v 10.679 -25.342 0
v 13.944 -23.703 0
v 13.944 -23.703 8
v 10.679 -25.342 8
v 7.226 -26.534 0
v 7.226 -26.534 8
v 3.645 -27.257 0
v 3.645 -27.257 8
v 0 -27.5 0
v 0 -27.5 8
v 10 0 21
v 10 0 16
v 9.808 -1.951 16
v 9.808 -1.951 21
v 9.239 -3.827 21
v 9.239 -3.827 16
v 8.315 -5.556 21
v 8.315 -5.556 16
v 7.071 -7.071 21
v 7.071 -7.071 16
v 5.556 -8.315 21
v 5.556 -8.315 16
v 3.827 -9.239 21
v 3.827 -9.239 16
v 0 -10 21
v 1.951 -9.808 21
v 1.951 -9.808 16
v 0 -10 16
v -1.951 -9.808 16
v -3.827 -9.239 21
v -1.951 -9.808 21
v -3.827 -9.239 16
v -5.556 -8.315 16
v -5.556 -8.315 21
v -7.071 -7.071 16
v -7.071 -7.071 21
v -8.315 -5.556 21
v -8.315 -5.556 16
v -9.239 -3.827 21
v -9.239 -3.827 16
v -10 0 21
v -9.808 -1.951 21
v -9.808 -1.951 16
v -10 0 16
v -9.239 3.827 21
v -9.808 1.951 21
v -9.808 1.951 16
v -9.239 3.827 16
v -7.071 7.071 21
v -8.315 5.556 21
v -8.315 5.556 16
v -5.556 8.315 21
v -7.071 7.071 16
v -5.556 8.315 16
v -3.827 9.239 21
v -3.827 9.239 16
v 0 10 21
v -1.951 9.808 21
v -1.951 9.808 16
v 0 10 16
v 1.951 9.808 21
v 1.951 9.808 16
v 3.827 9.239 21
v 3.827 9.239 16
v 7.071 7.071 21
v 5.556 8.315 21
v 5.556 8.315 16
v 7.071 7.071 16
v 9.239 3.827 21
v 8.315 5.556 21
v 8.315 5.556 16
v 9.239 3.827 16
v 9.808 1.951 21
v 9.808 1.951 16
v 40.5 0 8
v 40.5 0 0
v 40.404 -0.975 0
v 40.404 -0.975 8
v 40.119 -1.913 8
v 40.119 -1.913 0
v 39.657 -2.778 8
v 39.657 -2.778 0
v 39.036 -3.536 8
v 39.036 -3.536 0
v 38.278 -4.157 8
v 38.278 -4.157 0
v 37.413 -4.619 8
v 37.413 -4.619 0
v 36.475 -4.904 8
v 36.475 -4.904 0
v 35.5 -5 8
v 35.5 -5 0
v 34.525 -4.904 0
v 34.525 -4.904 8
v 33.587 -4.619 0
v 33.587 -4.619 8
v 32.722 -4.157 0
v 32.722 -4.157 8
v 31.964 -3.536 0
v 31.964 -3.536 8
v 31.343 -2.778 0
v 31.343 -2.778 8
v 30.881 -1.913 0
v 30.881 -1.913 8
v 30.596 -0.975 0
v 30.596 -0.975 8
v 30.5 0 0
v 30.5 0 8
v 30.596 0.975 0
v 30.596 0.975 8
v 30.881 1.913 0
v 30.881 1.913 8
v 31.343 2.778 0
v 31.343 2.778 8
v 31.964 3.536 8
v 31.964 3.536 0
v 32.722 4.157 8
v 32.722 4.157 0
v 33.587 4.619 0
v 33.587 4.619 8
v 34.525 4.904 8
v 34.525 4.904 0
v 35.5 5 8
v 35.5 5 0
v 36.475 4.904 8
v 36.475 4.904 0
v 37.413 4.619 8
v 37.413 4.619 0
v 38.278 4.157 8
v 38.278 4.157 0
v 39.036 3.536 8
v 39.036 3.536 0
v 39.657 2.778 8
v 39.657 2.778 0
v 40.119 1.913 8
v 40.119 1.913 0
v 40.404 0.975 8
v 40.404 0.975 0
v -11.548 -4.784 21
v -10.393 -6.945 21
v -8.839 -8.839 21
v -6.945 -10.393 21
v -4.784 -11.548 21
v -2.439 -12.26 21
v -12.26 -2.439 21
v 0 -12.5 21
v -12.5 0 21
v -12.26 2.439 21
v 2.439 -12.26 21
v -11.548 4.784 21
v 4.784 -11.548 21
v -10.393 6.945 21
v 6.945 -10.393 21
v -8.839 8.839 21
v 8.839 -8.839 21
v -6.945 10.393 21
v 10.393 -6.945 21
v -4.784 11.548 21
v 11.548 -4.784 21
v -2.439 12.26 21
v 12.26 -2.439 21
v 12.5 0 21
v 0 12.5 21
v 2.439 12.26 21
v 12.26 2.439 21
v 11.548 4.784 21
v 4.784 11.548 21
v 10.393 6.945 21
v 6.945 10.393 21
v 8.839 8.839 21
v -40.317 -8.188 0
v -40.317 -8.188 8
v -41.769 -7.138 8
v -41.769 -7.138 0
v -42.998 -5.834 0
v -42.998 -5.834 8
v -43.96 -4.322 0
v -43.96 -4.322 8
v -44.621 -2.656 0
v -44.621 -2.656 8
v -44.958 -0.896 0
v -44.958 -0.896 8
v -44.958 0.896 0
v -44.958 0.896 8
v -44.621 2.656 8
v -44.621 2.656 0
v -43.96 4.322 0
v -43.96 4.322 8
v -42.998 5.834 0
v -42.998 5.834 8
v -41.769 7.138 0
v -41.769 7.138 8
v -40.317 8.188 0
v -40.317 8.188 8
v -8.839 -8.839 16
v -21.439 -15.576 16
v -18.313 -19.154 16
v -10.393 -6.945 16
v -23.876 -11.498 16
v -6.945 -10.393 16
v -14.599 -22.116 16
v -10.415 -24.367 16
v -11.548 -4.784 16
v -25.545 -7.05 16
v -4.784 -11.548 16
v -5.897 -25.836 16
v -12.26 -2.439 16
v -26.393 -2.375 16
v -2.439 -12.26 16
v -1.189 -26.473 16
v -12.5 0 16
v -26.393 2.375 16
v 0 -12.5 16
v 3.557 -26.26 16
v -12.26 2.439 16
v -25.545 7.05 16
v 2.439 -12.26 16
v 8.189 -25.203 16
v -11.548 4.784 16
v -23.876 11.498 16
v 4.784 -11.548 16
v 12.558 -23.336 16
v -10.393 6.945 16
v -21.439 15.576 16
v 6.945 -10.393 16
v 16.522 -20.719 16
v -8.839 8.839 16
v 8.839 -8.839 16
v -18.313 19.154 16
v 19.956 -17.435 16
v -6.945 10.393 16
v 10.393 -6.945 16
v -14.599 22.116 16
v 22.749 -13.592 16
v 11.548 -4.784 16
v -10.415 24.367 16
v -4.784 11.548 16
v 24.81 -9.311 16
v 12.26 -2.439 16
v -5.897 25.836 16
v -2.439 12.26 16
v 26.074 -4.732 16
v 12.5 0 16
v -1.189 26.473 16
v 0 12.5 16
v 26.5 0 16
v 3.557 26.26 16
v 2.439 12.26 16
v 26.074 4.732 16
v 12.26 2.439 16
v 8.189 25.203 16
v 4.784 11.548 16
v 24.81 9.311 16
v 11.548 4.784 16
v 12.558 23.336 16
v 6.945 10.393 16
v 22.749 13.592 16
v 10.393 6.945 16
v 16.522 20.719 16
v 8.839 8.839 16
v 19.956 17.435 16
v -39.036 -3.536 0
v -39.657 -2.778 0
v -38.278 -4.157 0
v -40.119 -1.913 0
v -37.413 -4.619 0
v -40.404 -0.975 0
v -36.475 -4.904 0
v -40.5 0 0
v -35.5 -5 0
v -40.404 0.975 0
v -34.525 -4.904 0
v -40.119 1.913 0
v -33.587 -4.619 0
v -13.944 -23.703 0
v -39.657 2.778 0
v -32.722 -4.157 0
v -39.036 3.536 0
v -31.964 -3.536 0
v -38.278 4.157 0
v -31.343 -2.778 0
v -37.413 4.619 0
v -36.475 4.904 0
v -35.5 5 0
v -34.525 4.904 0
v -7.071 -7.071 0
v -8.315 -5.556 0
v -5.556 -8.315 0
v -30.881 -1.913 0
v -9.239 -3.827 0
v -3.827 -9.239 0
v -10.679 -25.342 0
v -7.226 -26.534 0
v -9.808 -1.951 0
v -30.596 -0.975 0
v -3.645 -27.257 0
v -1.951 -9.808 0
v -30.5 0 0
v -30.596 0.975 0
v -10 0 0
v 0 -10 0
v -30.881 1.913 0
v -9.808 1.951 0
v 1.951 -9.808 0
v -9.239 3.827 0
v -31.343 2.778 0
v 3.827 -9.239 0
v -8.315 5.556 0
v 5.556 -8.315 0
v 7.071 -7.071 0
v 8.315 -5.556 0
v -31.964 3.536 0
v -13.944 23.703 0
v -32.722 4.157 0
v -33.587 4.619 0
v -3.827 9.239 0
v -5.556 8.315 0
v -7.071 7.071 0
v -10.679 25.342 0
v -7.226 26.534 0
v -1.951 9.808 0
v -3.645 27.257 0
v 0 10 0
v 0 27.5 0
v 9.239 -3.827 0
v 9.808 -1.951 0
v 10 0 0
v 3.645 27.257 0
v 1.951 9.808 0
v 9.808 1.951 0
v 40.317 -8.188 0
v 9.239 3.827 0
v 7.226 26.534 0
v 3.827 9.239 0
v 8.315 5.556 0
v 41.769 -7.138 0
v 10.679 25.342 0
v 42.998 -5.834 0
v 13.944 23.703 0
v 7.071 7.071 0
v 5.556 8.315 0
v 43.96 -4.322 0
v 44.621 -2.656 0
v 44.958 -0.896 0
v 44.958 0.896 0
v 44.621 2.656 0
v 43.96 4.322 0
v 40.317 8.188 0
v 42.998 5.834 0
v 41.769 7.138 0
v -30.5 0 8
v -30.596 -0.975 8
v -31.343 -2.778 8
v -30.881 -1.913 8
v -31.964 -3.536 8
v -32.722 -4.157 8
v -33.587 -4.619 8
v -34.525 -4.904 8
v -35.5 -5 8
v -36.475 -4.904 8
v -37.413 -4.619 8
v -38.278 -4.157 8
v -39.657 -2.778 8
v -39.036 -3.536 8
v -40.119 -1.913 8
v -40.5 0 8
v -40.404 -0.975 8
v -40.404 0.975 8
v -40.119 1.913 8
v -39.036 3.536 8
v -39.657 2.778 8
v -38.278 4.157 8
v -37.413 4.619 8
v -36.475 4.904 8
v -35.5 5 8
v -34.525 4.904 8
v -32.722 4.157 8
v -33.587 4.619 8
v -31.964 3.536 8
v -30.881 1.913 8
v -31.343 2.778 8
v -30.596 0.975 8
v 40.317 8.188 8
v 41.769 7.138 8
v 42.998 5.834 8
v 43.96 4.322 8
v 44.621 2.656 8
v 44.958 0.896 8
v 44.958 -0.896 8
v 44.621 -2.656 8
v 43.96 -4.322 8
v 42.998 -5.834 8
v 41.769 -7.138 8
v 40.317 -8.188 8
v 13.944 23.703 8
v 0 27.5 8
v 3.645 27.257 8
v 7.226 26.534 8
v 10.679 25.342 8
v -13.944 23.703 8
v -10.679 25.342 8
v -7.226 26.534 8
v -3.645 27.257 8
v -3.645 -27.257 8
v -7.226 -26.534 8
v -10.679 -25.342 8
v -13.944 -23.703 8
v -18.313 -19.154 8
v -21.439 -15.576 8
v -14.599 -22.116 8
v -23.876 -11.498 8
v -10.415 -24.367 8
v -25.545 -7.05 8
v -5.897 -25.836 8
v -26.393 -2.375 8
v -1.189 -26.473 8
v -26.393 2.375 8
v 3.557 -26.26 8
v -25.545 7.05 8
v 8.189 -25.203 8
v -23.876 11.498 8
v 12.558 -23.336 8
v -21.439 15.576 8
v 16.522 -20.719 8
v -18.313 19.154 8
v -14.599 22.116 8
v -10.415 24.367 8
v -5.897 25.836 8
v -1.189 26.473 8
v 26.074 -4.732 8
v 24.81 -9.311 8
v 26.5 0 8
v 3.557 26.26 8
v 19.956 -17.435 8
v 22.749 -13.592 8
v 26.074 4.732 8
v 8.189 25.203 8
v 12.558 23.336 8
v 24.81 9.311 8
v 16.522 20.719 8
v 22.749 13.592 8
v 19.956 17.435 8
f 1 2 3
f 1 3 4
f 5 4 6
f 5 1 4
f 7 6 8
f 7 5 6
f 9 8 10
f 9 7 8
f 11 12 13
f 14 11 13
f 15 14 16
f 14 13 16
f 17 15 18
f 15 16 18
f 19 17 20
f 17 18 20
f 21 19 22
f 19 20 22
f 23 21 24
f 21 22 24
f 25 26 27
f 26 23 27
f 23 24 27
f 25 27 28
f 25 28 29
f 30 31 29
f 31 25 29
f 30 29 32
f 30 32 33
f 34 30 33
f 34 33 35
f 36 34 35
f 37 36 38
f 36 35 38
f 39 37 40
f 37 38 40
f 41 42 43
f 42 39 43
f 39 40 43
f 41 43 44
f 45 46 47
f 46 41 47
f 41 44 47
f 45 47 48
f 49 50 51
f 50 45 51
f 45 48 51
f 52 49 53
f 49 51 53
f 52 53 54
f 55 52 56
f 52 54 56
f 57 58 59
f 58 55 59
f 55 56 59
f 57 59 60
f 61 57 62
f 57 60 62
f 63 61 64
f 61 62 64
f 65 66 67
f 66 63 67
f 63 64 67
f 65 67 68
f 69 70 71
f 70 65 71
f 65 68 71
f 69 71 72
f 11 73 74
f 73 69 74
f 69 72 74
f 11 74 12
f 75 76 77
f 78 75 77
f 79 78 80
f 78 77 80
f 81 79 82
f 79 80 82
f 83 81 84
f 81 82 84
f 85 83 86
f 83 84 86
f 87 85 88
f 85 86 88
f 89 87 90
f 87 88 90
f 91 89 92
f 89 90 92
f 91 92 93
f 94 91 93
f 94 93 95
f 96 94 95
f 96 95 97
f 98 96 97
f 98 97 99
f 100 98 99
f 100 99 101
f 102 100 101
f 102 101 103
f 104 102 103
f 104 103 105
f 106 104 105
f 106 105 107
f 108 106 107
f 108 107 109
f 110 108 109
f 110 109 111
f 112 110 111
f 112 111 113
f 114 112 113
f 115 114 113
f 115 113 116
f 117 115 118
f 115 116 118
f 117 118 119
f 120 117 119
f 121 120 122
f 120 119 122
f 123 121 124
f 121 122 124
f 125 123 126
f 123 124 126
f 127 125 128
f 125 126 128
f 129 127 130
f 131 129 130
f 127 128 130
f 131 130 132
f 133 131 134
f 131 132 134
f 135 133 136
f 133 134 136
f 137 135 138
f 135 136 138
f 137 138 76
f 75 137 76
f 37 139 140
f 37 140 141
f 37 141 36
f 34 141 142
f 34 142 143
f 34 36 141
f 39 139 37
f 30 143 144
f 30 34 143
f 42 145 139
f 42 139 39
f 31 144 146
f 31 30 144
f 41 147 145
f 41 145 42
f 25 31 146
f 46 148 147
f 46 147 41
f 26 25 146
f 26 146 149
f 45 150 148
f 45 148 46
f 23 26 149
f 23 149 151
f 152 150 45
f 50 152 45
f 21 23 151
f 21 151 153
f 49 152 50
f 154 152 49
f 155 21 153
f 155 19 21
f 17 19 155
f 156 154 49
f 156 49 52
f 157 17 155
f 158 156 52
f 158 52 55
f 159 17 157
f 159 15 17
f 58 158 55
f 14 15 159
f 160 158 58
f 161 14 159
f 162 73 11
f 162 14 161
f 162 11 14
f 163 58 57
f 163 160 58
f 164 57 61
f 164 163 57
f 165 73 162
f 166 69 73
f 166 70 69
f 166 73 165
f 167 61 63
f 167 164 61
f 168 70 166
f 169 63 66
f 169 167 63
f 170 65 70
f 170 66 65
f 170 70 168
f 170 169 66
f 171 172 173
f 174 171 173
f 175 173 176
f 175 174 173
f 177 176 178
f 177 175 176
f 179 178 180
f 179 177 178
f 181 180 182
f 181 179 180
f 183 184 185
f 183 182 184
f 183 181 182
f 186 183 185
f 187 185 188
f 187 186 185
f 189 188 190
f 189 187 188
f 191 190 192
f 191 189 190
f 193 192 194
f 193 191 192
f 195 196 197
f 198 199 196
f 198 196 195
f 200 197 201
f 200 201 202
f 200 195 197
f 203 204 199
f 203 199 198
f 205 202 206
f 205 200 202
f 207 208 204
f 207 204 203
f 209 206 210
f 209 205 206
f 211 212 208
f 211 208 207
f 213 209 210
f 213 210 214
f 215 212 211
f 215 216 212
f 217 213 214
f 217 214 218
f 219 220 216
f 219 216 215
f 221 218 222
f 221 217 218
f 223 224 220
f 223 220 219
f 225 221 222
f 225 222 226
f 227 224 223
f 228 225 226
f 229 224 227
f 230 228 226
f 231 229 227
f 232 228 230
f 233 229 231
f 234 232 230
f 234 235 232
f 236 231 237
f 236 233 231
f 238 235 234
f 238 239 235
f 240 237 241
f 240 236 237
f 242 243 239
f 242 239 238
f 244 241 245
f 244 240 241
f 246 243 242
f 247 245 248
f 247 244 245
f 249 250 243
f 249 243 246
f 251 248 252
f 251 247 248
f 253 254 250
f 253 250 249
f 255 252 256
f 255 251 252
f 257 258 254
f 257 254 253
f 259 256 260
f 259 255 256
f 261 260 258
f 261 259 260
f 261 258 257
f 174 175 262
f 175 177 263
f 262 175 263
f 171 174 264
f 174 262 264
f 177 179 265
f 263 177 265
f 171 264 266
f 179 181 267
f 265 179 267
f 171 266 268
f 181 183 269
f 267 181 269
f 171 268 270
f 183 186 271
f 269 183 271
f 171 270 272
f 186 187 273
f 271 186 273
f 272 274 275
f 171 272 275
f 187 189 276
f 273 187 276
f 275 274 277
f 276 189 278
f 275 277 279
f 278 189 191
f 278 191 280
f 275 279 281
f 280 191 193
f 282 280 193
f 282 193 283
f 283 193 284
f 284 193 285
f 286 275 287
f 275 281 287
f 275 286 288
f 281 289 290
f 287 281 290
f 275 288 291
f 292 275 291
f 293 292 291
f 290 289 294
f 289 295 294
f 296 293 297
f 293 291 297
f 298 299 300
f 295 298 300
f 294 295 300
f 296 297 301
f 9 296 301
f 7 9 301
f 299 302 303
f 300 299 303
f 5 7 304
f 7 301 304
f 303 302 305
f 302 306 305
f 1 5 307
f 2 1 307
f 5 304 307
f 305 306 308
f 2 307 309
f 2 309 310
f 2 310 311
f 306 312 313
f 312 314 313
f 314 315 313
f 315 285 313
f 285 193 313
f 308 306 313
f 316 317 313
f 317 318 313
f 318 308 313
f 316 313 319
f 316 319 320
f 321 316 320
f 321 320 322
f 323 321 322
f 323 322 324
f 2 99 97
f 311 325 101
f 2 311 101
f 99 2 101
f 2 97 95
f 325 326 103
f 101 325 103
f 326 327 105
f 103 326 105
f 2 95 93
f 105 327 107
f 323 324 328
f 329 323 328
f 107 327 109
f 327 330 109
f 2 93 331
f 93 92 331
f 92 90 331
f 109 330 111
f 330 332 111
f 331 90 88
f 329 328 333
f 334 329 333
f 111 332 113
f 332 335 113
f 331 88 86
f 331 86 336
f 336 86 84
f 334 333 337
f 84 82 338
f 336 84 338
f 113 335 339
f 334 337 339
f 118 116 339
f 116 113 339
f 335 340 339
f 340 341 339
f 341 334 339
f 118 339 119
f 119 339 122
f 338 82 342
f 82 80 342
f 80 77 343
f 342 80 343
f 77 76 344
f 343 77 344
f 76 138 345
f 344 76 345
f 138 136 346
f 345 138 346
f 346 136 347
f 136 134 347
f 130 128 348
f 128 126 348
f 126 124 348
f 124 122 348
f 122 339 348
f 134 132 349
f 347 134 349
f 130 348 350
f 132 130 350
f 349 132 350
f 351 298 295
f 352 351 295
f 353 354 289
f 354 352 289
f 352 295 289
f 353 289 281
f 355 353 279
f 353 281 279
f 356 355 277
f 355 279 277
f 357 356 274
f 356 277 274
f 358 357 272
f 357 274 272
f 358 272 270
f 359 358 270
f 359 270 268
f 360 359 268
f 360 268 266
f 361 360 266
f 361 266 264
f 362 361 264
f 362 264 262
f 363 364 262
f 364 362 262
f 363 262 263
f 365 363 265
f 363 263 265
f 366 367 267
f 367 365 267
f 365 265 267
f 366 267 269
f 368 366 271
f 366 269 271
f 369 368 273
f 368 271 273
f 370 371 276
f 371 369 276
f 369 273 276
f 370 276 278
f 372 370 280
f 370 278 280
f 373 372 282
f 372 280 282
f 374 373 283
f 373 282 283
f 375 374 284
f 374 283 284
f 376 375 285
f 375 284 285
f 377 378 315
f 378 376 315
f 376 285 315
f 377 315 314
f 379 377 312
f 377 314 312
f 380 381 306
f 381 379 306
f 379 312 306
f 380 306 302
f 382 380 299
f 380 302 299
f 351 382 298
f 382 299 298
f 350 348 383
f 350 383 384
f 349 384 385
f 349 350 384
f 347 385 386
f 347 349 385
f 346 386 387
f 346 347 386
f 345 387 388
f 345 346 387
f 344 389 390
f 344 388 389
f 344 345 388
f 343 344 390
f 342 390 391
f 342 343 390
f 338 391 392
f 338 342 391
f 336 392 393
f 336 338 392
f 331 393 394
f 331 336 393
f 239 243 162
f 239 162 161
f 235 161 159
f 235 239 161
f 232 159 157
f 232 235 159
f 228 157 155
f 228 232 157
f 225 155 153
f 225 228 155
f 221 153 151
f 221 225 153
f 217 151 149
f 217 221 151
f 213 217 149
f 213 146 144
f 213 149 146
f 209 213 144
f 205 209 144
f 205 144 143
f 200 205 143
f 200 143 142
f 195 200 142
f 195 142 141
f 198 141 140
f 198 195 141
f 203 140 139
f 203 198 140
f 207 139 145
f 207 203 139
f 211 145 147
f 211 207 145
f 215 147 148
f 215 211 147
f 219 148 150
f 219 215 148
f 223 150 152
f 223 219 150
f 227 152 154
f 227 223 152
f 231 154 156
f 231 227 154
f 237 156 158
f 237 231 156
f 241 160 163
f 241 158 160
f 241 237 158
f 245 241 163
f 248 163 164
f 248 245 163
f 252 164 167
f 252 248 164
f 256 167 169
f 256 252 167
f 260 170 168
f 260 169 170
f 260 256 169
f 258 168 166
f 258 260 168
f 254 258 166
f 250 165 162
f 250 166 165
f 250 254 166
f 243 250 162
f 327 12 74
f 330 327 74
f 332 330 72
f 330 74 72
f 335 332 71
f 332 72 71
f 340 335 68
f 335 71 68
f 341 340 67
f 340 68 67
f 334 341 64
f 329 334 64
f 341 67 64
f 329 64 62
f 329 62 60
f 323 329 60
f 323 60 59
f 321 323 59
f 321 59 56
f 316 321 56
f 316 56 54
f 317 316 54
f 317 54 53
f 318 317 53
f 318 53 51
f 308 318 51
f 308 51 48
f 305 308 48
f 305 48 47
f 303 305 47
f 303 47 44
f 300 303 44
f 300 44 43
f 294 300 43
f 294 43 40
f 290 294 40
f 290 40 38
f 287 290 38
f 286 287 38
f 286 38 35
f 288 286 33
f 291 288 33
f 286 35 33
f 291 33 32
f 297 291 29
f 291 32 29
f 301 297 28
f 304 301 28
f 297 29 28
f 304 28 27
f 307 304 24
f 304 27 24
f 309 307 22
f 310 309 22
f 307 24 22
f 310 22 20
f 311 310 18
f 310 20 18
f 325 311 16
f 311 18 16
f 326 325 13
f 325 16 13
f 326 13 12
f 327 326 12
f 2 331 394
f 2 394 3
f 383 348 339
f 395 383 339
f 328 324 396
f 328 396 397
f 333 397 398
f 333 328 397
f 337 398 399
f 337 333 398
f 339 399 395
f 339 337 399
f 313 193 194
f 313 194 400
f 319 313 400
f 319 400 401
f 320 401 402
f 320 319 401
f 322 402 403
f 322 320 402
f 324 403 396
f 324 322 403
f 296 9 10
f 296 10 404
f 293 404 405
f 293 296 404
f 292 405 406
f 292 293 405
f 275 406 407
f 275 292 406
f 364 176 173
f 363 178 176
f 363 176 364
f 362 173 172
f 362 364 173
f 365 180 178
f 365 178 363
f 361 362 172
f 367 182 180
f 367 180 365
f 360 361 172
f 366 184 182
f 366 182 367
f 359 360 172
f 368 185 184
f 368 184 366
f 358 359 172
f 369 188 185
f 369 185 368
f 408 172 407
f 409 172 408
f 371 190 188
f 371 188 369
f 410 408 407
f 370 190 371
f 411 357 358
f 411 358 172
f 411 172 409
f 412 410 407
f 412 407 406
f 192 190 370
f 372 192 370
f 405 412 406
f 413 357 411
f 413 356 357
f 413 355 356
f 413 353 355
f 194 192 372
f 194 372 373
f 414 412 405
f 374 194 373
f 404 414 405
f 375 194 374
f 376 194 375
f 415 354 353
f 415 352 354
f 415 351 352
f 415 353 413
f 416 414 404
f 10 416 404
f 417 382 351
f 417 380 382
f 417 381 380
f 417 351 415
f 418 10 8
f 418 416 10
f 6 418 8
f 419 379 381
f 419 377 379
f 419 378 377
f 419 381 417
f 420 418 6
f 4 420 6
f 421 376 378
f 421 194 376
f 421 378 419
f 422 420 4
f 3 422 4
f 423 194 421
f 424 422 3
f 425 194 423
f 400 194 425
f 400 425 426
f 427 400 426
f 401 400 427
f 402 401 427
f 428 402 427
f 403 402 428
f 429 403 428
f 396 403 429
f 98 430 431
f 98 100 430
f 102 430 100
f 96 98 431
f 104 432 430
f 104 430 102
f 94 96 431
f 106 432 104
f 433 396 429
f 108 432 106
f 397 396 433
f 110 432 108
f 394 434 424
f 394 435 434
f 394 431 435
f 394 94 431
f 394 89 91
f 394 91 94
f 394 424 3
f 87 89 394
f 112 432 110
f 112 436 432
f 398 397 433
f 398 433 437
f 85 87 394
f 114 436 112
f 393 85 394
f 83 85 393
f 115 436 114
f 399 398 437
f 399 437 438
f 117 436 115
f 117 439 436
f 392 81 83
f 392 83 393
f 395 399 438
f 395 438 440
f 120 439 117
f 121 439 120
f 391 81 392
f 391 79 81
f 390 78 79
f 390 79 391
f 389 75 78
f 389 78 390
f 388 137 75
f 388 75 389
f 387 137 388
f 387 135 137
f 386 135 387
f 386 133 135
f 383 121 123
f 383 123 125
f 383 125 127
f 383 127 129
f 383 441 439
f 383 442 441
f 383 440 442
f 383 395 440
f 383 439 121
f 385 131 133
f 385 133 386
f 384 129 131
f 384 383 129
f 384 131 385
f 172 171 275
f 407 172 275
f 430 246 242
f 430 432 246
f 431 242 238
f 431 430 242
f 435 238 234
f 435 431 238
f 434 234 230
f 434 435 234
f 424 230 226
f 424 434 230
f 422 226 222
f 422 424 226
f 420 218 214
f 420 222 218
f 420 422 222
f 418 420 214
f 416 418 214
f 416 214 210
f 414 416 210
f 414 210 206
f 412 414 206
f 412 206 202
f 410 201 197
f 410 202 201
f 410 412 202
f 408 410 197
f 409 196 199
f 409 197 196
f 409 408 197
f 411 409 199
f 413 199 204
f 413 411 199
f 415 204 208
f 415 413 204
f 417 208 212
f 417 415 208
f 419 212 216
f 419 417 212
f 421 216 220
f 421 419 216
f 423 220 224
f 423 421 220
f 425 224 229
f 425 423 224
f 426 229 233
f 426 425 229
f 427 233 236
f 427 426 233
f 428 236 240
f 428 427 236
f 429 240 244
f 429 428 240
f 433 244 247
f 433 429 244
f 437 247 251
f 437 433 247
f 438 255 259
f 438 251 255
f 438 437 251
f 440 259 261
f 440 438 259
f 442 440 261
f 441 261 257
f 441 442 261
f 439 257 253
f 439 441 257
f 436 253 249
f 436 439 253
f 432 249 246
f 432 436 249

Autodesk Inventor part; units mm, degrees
ref_plane "YZ Plane" through (0, 0, 0) normal (1, 0, 0) x (0, 1, 0)
ref_plane "XZ Plane" through (0, 0, 0) normal (0, 1, 0) x (-1, 0, 0)
ref_plane "XY Plane" through (0, 0, 0) normal (0, 0, 1) x (1, 0, 0)
sketch "Sketch1" plane through (0, 0, 0) normal (0, 0, 1) x (1, 0, 0)
  line L0 (-26, 0) -> (-35.5, 0)
  circle A0 centre (-35.5, 0) radius 5
  line L1 (0, 0) -> (0, 5.7402)
  arc A1 (-40.3169, 8.1883) -> (-40.3169, -8.1883) centre (-35.5, 0) ccw
  line L2 (-40.3169, 8.1883) -> (-13.9437, 23.7028)
  line L3 (-40.3169, -8.1883) -> (-13.9437, -23.7028)
  arc A2 (-13.9437, -23.7028) -> (0, -27.5) centre (0, 0) ccw
  arc A3 (0, 27.5) -> (-13.9437, 23.7028) centre (0, 0) ccw
  line L4 (26, 0) -> (35.5, 0)
  circle A4 centre (35.5, 0) radius 5
  arc A5 (40.3169, -8.1883) -> (40.3169, 8.1883) centre (35.5, 0) ccw
  line L5 (40.3169, 8.1883) -> (13.9437, 23.7028)
  line L6 (40.3169, -8.1883) -> (13.9437, -23.7028)
  arc A6 (0, -27.5) -> (13.9437, -23.7028) centre (0, 0) ccw
  arc A7 (13.9437, 23.7028) -> (0, 27.5) centre (0, 0) ccw
  dimension "d1" = 35.5
  dimension "d2" = 10
  dimension "d15" = 19
extrude "Extrusion1" add sketch "Sketch1" along normal blind 8
sketch "Sketch2" plane through (0, 0, 8) normal (0, 0, 1) x (1, 0, 0)
  circle A0 centre (0, 0) radius 26.5
  dimension "d6" = 53
extrude "Extrusion2" add sketch "Sketch2" along normal blind 8
sketch "Sketch3" plane through (0, 0, 16) normal (0, 0, 1) x (1, 0, 0)
  circle A0 centre (0, 0) radius 10
  circle A1 centre (0, 0) radius 12.5
  dimension "d9" = 20
  dimension "d10" = 25
extrude "Extrusion3" add sketch "Sketch3" along normal blind 5
sketch "Sketch4" plane through (0, 0, 16) normal (0, 0, 1) x (1, 0, 0)
  circle A0 centre (0, 0) radius 10 projected
extrude "Extrusion4" cut sketch "Sketch4" against normal blind 30
properties part number "RODAMIENTO DE PARED"
